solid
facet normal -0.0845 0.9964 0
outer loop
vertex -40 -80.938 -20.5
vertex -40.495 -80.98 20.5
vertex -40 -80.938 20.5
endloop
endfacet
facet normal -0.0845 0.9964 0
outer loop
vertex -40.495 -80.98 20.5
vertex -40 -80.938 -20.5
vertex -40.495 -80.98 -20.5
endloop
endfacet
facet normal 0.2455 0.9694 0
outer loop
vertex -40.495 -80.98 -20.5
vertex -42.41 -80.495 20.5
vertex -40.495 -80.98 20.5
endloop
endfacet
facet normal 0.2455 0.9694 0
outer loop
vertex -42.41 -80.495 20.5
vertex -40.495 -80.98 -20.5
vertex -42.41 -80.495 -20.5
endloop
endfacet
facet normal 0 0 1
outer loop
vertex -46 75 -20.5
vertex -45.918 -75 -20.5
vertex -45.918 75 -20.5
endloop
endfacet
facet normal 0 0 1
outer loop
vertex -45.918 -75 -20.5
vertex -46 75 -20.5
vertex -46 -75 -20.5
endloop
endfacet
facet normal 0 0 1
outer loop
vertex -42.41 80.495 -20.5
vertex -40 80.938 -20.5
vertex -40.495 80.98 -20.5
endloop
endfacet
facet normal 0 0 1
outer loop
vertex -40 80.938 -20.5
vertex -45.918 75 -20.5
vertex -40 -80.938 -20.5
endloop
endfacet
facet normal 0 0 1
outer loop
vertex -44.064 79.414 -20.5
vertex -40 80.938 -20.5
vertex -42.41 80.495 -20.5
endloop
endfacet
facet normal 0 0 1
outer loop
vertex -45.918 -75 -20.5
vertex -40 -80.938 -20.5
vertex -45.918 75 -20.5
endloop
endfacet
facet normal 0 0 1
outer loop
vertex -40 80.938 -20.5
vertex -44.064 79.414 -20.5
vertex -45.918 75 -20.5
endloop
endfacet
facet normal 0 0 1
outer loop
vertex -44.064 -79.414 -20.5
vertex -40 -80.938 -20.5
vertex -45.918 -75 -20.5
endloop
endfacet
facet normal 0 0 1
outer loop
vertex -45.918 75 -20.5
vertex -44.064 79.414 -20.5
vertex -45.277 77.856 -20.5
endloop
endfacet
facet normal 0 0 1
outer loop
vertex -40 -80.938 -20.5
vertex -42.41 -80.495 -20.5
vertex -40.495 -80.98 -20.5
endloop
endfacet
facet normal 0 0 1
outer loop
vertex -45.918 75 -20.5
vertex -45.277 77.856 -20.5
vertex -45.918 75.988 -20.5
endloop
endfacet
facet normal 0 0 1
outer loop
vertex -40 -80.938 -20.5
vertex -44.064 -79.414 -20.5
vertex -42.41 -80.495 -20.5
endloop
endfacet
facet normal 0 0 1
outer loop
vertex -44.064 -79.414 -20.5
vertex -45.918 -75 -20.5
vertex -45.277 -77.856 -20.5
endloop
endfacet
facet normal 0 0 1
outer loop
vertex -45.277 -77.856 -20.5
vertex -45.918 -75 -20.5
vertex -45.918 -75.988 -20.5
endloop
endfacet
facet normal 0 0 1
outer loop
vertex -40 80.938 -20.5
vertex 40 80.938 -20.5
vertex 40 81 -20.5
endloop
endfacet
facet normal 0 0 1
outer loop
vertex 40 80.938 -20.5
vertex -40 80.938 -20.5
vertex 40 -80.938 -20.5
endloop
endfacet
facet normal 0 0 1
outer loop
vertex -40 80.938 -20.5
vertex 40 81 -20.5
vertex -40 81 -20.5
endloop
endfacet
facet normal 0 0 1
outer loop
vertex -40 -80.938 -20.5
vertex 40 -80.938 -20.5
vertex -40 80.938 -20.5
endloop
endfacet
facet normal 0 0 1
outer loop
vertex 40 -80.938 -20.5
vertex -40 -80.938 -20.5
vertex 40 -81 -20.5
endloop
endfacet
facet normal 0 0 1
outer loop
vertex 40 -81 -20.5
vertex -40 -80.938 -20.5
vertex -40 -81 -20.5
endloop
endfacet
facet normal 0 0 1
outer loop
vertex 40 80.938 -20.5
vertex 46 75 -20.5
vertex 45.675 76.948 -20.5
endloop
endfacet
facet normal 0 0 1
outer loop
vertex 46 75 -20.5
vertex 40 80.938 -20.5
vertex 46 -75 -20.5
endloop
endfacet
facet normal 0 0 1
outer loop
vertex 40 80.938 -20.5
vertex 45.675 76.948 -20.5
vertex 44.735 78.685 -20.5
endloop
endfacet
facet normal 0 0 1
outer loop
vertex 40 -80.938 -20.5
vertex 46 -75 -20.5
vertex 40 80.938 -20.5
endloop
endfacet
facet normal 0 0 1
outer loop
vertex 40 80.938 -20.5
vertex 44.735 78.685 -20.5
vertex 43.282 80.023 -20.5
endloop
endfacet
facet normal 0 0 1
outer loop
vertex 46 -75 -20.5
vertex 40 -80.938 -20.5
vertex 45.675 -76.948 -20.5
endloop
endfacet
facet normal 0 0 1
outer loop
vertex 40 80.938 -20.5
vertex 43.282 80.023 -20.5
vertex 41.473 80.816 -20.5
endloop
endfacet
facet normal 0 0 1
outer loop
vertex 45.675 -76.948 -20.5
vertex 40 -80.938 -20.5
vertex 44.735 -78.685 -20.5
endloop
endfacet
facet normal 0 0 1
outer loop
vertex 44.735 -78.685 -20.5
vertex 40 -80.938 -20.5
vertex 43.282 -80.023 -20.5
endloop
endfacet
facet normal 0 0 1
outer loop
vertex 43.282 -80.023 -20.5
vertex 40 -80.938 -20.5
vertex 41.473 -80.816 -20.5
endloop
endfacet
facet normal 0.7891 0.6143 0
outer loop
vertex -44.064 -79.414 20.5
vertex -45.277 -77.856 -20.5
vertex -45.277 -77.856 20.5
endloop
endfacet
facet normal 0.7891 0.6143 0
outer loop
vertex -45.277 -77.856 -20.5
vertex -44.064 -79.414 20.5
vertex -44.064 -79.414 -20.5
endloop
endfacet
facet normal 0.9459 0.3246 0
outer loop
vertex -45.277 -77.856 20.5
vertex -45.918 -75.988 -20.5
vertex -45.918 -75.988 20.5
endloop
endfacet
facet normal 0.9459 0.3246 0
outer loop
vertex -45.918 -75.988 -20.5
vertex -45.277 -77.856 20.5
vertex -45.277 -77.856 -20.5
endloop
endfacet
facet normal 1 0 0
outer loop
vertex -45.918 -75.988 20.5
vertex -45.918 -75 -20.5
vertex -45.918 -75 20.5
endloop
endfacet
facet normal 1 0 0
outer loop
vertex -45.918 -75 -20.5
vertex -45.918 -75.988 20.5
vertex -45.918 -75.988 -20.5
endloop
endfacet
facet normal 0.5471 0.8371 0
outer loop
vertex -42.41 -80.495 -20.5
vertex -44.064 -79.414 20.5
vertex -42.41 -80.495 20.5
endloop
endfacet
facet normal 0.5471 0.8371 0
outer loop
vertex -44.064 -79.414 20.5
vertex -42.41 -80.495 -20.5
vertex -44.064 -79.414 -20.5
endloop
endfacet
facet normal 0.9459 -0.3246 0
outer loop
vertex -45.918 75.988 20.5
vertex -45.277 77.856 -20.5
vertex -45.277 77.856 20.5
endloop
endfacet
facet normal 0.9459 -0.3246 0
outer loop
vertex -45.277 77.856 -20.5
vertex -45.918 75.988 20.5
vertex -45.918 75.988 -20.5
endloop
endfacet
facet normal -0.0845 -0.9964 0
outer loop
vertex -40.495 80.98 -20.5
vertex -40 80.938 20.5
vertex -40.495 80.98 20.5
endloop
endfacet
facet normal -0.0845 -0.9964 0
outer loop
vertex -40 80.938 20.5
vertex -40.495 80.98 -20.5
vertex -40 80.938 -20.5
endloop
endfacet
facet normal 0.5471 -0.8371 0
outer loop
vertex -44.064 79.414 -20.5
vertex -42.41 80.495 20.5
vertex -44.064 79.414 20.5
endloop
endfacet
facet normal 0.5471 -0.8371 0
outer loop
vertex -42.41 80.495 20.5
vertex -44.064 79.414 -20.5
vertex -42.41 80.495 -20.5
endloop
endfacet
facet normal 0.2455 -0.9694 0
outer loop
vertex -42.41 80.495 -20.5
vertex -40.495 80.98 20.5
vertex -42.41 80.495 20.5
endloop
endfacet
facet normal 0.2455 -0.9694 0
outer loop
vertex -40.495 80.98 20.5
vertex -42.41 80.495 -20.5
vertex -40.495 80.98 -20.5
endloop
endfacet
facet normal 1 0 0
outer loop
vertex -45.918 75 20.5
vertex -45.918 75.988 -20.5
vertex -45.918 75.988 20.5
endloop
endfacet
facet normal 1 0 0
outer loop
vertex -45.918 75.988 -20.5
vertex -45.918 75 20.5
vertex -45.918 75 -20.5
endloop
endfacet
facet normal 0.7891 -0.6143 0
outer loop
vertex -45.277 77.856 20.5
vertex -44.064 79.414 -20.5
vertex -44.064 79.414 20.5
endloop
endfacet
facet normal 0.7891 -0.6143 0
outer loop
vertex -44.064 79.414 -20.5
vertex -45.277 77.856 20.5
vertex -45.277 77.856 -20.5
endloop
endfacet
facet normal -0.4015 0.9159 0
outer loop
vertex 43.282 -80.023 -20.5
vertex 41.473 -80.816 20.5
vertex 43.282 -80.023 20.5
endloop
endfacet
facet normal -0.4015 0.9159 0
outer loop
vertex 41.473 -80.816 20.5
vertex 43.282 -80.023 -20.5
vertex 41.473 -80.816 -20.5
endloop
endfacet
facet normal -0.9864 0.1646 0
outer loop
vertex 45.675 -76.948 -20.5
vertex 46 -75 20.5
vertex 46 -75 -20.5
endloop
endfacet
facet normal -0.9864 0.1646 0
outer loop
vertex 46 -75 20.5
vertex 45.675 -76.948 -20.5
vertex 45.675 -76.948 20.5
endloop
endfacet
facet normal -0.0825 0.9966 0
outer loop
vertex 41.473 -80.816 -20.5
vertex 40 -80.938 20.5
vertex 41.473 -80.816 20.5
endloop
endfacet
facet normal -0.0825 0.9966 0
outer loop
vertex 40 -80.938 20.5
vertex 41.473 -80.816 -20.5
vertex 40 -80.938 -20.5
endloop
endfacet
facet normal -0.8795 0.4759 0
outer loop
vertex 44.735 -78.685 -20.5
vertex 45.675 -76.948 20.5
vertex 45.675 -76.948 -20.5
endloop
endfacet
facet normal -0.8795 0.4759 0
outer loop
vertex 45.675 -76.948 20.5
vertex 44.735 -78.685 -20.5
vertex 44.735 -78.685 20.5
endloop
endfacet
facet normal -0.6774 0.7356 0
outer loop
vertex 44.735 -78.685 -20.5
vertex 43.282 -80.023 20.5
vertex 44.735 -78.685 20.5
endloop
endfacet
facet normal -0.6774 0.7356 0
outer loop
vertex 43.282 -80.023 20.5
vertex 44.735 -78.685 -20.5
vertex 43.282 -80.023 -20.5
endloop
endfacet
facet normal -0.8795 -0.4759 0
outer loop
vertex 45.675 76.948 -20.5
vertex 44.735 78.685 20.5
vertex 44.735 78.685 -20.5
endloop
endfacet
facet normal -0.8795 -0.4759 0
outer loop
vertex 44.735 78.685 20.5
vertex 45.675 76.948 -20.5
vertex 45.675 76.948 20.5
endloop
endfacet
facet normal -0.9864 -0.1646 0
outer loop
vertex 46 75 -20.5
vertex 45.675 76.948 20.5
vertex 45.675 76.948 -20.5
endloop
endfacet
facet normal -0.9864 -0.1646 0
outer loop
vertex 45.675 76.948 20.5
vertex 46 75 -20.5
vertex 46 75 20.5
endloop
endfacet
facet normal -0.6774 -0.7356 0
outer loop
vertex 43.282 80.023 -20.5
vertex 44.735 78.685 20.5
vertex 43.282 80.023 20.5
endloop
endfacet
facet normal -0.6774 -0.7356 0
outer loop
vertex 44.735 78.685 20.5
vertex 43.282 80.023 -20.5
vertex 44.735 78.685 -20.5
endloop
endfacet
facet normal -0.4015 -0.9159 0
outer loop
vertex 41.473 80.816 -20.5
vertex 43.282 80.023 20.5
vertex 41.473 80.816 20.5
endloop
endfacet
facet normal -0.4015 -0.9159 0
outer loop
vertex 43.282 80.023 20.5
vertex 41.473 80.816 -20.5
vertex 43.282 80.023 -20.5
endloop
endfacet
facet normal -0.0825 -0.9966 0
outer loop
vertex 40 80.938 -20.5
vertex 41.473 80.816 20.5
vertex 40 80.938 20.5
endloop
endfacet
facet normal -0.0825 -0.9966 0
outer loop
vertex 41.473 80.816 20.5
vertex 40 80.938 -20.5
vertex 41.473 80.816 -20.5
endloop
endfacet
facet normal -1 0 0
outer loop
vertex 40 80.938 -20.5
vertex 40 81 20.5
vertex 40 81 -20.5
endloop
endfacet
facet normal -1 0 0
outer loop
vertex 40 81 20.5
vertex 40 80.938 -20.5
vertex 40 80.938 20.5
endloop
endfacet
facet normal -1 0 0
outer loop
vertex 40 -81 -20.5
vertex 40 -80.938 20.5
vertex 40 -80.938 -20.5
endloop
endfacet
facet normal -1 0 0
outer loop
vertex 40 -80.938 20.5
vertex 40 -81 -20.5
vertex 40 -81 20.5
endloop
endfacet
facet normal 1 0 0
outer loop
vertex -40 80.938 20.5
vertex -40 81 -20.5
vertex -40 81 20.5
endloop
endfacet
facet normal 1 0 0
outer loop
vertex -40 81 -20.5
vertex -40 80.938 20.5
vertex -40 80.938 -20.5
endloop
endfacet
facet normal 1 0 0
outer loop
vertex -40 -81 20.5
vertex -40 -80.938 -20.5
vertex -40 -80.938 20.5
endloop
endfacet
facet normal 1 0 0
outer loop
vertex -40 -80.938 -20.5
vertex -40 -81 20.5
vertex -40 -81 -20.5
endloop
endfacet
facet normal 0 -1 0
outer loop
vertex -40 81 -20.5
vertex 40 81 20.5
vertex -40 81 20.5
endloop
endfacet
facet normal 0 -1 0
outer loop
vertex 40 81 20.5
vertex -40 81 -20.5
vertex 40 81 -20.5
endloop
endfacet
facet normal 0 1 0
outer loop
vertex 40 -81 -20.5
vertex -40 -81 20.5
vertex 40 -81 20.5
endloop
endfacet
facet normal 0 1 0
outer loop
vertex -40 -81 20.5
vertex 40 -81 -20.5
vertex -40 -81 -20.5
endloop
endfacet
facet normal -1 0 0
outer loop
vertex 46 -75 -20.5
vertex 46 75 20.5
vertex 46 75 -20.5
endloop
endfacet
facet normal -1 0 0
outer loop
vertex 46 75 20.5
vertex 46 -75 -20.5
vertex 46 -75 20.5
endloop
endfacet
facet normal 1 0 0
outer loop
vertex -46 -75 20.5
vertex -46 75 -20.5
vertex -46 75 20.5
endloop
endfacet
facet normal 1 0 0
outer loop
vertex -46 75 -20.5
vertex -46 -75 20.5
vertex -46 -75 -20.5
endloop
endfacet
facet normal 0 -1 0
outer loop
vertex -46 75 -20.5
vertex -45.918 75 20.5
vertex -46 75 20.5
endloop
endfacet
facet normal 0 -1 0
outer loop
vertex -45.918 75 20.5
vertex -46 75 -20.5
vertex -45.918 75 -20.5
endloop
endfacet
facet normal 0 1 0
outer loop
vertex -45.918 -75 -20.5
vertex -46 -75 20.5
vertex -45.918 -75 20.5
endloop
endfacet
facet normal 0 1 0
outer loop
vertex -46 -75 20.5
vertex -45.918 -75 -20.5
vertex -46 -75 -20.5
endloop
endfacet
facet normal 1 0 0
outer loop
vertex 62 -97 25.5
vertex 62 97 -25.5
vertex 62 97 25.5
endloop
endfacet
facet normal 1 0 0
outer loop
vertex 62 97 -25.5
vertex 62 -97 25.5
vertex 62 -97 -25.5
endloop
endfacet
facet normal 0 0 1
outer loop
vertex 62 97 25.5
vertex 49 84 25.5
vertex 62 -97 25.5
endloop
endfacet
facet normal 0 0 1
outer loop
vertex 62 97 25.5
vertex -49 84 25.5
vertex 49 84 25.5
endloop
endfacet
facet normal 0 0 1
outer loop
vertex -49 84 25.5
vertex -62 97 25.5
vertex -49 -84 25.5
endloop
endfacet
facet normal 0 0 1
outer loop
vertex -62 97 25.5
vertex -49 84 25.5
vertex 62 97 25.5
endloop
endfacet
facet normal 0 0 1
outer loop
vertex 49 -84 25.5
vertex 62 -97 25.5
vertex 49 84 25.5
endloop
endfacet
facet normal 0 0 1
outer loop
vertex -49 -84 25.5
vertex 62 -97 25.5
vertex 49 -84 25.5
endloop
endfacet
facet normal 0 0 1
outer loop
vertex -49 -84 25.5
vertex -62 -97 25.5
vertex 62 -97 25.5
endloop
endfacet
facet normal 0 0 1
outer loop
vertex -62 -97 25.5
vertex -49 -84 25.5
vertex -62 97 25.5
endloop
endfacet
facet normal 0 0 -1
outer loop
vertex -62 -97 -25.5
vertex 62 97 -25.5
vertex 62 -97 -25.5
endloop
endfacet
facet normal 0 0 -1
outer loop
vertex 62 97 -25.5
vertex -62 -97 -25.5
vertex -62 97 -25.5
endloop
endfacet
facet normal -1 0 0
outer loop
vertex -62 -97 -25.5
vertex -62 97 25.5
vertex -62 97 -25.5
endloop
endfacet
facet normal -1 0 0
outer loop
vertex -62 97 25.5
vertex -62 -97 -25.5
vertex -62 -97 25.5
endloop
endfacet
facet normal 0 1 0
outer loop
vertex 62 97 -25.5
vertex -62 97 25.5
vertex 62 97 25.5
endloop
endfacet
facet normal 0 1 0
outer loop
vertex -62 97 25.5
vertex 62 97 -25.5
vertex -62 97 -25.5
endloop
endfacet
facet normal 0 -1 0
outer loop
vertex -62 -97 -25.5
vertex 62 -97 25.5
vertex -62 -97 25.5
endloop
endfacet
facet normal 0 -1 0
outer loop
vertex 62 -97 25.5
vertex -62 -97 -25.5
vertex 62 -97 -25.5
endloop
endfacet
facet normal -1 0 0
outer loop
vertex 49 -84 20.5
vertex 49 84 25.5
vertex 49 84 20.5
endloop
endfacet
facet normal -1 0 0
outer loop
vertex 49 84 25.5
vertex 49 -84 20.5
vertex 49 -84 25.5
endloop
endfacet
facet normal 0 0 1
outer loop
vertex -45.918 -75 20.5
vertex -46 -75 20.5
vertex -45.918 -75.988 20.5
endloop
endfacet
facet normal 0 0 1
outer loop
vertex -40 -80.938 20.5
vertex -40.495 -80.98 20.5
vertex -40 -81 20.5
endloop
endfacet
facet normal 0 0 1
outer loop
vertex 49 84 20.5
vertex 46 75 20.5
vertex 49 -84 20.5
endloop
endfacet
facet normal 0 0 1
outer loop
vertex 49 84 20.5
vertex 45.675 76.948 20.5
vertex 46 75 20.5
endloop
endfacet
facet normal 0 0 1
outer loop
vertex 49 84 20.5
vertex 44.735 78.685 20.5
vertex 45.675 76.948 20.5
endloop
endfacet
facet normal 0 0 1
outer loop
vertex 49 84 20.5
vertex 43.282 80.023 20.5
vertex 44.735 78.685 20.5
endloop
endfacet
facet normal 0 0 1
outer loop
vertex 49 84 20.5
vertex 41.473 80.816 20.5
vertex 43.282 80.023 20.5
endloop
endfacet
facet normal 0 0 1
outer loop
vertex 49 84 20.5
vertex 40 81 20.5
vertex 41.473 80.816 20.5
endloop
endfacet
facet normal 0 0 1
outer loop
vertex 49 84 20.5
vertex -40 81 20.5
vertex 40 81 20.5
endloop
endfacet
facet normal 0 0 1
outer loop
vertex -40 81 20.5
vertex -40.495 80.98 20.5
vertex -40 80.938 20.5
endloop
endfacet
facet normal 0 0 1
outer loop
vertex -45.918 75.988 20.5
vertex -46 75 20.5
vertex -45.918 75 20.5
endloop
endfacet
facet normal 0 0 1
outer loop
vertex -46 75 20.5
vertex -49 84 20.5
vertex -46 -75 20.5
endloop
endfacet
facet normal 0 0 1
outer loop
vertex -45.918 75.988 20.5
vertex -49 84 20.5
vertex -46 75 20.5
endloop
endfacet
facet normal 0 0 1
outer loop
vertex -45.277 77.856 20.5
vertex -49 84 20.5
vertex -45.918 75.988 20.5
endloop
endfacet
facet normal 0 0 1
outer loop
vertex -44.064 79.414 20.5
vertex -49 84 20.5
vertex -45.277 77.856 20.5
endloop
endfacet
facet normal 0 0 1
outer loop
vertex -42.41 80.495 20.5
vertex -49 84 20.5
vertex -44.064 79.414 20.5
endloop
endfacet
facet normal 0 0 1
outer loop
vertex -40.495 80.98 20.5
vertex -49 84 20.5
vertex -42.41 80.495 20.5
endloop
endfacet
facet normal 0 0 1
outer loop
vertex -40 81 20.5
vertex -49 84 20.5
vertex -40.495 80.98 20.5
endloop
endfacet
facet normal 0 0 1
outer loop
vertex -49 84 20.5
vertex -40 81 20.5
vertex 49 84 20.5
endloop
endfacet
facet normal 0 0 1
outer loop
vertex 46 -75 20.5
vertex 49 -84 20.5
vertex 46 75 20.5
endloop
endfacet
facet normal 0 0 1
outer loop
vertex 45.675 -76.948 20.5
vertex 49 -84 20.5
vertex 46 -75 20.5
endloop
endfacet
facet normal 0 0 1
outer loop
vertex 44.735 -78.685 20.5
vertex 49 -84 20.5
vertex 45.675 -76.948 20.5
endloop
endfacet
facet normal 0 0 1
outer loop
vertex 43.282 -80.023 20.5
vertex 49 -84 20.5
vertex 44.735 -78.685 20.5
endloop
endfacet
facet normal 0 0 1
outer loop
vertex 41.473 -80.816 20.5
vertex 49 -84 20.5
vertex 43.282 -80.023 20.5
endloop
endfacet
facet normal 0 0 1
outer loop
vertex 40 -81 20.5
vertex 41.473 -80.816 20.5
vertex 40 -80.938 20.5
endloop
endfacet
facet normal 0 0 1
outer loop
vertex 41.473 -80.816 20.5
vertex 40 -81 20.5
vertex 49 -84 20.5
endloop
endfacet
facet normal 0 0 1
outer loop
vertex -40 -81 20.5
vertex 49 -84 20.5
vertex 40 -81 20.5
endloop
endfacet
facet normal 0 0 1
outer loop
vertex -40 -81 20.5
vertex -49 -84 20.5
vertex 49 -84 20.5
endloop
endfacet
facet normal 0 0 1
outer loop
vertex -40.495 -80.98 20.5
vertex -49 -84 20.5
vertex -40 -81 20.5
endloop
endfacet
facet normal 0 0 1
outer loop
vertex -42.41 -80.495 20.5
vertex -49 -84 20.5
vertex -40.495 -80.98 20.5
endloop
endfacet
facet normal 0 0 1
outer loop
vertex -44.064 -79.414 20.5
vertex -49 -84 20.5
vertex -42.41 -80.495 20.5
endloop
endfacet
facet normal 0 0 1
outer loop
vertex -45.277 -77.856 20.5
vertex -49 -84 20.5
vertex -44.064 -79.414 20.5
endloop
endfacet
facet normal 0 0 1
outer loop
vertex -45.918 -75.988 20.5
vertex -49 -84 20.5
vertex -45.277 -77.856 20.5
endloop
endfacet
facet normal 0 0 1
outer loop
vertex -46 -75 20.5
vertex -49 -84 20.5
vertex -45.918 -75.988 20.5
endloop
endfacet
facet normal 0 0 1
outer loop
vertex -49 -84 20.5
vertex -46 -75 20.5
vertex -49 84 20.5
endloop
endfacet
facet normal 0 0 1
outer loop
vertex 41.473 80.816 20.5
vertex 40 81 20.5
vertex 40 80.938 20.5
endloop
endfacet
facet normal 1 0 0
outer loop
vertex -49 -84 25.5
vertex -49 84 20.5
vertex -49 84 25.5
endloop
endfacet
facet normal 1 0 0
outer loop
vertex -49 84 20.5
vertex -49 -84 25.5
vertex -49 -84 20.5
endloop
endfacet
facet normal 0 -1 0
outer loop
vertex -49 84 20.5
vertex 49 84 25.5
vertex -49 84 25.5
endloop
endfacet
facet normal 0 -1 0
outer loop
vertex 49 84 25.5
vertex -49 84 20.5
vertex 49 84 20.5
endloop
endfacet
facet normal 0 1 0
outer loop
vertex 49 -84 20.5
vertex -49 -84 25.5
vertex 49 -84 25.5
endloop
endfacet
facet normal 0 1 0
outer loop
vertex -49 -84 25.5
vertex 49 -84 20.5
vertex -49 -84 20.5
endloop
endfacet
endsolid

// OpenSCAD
// [FL_INDEX: keywords="openscad, 3d_parametric, Customizable_Gaggia_Classic_Drip_Tray, csg_solid" | COT="Parametric OpenSCAD design from 3DCodeverse"]
// Title: Customizable Gaggia Classic Drip Tray

include <MCAD/shapes.scad>

// Height of drip tray
height_text_box=51;
// Tray depth
tray_width_text_box=98;
// Tray length
tray_length_text_box=168;
// Tray bottom thickness
bottom_thickness_slider=5; // [0:20]
// Tray insert height
tray_height_slider=5; // [0:10]
// Tray insert lip
tray_lip_slider=6; // [0:20]

height = height_text_box;
tray_width = tray_width_text_box;
tray_length = tray_length_text_box;
bottom_thickness = bottom_thickness_slider;
tray_height = tray_height_slider;
tray_lip = tray_lip_slider;

difference() {
	cube([124, 194, height], center=true);
	translate([0,0,bottom_thickness]) roundedBox(tray_width-tray_lip, tray_length-tray_lip, height, tray_lip);
	translate([0,0,height-tray_height]) cube([tray_width, tray_length, height], center=true);
}
